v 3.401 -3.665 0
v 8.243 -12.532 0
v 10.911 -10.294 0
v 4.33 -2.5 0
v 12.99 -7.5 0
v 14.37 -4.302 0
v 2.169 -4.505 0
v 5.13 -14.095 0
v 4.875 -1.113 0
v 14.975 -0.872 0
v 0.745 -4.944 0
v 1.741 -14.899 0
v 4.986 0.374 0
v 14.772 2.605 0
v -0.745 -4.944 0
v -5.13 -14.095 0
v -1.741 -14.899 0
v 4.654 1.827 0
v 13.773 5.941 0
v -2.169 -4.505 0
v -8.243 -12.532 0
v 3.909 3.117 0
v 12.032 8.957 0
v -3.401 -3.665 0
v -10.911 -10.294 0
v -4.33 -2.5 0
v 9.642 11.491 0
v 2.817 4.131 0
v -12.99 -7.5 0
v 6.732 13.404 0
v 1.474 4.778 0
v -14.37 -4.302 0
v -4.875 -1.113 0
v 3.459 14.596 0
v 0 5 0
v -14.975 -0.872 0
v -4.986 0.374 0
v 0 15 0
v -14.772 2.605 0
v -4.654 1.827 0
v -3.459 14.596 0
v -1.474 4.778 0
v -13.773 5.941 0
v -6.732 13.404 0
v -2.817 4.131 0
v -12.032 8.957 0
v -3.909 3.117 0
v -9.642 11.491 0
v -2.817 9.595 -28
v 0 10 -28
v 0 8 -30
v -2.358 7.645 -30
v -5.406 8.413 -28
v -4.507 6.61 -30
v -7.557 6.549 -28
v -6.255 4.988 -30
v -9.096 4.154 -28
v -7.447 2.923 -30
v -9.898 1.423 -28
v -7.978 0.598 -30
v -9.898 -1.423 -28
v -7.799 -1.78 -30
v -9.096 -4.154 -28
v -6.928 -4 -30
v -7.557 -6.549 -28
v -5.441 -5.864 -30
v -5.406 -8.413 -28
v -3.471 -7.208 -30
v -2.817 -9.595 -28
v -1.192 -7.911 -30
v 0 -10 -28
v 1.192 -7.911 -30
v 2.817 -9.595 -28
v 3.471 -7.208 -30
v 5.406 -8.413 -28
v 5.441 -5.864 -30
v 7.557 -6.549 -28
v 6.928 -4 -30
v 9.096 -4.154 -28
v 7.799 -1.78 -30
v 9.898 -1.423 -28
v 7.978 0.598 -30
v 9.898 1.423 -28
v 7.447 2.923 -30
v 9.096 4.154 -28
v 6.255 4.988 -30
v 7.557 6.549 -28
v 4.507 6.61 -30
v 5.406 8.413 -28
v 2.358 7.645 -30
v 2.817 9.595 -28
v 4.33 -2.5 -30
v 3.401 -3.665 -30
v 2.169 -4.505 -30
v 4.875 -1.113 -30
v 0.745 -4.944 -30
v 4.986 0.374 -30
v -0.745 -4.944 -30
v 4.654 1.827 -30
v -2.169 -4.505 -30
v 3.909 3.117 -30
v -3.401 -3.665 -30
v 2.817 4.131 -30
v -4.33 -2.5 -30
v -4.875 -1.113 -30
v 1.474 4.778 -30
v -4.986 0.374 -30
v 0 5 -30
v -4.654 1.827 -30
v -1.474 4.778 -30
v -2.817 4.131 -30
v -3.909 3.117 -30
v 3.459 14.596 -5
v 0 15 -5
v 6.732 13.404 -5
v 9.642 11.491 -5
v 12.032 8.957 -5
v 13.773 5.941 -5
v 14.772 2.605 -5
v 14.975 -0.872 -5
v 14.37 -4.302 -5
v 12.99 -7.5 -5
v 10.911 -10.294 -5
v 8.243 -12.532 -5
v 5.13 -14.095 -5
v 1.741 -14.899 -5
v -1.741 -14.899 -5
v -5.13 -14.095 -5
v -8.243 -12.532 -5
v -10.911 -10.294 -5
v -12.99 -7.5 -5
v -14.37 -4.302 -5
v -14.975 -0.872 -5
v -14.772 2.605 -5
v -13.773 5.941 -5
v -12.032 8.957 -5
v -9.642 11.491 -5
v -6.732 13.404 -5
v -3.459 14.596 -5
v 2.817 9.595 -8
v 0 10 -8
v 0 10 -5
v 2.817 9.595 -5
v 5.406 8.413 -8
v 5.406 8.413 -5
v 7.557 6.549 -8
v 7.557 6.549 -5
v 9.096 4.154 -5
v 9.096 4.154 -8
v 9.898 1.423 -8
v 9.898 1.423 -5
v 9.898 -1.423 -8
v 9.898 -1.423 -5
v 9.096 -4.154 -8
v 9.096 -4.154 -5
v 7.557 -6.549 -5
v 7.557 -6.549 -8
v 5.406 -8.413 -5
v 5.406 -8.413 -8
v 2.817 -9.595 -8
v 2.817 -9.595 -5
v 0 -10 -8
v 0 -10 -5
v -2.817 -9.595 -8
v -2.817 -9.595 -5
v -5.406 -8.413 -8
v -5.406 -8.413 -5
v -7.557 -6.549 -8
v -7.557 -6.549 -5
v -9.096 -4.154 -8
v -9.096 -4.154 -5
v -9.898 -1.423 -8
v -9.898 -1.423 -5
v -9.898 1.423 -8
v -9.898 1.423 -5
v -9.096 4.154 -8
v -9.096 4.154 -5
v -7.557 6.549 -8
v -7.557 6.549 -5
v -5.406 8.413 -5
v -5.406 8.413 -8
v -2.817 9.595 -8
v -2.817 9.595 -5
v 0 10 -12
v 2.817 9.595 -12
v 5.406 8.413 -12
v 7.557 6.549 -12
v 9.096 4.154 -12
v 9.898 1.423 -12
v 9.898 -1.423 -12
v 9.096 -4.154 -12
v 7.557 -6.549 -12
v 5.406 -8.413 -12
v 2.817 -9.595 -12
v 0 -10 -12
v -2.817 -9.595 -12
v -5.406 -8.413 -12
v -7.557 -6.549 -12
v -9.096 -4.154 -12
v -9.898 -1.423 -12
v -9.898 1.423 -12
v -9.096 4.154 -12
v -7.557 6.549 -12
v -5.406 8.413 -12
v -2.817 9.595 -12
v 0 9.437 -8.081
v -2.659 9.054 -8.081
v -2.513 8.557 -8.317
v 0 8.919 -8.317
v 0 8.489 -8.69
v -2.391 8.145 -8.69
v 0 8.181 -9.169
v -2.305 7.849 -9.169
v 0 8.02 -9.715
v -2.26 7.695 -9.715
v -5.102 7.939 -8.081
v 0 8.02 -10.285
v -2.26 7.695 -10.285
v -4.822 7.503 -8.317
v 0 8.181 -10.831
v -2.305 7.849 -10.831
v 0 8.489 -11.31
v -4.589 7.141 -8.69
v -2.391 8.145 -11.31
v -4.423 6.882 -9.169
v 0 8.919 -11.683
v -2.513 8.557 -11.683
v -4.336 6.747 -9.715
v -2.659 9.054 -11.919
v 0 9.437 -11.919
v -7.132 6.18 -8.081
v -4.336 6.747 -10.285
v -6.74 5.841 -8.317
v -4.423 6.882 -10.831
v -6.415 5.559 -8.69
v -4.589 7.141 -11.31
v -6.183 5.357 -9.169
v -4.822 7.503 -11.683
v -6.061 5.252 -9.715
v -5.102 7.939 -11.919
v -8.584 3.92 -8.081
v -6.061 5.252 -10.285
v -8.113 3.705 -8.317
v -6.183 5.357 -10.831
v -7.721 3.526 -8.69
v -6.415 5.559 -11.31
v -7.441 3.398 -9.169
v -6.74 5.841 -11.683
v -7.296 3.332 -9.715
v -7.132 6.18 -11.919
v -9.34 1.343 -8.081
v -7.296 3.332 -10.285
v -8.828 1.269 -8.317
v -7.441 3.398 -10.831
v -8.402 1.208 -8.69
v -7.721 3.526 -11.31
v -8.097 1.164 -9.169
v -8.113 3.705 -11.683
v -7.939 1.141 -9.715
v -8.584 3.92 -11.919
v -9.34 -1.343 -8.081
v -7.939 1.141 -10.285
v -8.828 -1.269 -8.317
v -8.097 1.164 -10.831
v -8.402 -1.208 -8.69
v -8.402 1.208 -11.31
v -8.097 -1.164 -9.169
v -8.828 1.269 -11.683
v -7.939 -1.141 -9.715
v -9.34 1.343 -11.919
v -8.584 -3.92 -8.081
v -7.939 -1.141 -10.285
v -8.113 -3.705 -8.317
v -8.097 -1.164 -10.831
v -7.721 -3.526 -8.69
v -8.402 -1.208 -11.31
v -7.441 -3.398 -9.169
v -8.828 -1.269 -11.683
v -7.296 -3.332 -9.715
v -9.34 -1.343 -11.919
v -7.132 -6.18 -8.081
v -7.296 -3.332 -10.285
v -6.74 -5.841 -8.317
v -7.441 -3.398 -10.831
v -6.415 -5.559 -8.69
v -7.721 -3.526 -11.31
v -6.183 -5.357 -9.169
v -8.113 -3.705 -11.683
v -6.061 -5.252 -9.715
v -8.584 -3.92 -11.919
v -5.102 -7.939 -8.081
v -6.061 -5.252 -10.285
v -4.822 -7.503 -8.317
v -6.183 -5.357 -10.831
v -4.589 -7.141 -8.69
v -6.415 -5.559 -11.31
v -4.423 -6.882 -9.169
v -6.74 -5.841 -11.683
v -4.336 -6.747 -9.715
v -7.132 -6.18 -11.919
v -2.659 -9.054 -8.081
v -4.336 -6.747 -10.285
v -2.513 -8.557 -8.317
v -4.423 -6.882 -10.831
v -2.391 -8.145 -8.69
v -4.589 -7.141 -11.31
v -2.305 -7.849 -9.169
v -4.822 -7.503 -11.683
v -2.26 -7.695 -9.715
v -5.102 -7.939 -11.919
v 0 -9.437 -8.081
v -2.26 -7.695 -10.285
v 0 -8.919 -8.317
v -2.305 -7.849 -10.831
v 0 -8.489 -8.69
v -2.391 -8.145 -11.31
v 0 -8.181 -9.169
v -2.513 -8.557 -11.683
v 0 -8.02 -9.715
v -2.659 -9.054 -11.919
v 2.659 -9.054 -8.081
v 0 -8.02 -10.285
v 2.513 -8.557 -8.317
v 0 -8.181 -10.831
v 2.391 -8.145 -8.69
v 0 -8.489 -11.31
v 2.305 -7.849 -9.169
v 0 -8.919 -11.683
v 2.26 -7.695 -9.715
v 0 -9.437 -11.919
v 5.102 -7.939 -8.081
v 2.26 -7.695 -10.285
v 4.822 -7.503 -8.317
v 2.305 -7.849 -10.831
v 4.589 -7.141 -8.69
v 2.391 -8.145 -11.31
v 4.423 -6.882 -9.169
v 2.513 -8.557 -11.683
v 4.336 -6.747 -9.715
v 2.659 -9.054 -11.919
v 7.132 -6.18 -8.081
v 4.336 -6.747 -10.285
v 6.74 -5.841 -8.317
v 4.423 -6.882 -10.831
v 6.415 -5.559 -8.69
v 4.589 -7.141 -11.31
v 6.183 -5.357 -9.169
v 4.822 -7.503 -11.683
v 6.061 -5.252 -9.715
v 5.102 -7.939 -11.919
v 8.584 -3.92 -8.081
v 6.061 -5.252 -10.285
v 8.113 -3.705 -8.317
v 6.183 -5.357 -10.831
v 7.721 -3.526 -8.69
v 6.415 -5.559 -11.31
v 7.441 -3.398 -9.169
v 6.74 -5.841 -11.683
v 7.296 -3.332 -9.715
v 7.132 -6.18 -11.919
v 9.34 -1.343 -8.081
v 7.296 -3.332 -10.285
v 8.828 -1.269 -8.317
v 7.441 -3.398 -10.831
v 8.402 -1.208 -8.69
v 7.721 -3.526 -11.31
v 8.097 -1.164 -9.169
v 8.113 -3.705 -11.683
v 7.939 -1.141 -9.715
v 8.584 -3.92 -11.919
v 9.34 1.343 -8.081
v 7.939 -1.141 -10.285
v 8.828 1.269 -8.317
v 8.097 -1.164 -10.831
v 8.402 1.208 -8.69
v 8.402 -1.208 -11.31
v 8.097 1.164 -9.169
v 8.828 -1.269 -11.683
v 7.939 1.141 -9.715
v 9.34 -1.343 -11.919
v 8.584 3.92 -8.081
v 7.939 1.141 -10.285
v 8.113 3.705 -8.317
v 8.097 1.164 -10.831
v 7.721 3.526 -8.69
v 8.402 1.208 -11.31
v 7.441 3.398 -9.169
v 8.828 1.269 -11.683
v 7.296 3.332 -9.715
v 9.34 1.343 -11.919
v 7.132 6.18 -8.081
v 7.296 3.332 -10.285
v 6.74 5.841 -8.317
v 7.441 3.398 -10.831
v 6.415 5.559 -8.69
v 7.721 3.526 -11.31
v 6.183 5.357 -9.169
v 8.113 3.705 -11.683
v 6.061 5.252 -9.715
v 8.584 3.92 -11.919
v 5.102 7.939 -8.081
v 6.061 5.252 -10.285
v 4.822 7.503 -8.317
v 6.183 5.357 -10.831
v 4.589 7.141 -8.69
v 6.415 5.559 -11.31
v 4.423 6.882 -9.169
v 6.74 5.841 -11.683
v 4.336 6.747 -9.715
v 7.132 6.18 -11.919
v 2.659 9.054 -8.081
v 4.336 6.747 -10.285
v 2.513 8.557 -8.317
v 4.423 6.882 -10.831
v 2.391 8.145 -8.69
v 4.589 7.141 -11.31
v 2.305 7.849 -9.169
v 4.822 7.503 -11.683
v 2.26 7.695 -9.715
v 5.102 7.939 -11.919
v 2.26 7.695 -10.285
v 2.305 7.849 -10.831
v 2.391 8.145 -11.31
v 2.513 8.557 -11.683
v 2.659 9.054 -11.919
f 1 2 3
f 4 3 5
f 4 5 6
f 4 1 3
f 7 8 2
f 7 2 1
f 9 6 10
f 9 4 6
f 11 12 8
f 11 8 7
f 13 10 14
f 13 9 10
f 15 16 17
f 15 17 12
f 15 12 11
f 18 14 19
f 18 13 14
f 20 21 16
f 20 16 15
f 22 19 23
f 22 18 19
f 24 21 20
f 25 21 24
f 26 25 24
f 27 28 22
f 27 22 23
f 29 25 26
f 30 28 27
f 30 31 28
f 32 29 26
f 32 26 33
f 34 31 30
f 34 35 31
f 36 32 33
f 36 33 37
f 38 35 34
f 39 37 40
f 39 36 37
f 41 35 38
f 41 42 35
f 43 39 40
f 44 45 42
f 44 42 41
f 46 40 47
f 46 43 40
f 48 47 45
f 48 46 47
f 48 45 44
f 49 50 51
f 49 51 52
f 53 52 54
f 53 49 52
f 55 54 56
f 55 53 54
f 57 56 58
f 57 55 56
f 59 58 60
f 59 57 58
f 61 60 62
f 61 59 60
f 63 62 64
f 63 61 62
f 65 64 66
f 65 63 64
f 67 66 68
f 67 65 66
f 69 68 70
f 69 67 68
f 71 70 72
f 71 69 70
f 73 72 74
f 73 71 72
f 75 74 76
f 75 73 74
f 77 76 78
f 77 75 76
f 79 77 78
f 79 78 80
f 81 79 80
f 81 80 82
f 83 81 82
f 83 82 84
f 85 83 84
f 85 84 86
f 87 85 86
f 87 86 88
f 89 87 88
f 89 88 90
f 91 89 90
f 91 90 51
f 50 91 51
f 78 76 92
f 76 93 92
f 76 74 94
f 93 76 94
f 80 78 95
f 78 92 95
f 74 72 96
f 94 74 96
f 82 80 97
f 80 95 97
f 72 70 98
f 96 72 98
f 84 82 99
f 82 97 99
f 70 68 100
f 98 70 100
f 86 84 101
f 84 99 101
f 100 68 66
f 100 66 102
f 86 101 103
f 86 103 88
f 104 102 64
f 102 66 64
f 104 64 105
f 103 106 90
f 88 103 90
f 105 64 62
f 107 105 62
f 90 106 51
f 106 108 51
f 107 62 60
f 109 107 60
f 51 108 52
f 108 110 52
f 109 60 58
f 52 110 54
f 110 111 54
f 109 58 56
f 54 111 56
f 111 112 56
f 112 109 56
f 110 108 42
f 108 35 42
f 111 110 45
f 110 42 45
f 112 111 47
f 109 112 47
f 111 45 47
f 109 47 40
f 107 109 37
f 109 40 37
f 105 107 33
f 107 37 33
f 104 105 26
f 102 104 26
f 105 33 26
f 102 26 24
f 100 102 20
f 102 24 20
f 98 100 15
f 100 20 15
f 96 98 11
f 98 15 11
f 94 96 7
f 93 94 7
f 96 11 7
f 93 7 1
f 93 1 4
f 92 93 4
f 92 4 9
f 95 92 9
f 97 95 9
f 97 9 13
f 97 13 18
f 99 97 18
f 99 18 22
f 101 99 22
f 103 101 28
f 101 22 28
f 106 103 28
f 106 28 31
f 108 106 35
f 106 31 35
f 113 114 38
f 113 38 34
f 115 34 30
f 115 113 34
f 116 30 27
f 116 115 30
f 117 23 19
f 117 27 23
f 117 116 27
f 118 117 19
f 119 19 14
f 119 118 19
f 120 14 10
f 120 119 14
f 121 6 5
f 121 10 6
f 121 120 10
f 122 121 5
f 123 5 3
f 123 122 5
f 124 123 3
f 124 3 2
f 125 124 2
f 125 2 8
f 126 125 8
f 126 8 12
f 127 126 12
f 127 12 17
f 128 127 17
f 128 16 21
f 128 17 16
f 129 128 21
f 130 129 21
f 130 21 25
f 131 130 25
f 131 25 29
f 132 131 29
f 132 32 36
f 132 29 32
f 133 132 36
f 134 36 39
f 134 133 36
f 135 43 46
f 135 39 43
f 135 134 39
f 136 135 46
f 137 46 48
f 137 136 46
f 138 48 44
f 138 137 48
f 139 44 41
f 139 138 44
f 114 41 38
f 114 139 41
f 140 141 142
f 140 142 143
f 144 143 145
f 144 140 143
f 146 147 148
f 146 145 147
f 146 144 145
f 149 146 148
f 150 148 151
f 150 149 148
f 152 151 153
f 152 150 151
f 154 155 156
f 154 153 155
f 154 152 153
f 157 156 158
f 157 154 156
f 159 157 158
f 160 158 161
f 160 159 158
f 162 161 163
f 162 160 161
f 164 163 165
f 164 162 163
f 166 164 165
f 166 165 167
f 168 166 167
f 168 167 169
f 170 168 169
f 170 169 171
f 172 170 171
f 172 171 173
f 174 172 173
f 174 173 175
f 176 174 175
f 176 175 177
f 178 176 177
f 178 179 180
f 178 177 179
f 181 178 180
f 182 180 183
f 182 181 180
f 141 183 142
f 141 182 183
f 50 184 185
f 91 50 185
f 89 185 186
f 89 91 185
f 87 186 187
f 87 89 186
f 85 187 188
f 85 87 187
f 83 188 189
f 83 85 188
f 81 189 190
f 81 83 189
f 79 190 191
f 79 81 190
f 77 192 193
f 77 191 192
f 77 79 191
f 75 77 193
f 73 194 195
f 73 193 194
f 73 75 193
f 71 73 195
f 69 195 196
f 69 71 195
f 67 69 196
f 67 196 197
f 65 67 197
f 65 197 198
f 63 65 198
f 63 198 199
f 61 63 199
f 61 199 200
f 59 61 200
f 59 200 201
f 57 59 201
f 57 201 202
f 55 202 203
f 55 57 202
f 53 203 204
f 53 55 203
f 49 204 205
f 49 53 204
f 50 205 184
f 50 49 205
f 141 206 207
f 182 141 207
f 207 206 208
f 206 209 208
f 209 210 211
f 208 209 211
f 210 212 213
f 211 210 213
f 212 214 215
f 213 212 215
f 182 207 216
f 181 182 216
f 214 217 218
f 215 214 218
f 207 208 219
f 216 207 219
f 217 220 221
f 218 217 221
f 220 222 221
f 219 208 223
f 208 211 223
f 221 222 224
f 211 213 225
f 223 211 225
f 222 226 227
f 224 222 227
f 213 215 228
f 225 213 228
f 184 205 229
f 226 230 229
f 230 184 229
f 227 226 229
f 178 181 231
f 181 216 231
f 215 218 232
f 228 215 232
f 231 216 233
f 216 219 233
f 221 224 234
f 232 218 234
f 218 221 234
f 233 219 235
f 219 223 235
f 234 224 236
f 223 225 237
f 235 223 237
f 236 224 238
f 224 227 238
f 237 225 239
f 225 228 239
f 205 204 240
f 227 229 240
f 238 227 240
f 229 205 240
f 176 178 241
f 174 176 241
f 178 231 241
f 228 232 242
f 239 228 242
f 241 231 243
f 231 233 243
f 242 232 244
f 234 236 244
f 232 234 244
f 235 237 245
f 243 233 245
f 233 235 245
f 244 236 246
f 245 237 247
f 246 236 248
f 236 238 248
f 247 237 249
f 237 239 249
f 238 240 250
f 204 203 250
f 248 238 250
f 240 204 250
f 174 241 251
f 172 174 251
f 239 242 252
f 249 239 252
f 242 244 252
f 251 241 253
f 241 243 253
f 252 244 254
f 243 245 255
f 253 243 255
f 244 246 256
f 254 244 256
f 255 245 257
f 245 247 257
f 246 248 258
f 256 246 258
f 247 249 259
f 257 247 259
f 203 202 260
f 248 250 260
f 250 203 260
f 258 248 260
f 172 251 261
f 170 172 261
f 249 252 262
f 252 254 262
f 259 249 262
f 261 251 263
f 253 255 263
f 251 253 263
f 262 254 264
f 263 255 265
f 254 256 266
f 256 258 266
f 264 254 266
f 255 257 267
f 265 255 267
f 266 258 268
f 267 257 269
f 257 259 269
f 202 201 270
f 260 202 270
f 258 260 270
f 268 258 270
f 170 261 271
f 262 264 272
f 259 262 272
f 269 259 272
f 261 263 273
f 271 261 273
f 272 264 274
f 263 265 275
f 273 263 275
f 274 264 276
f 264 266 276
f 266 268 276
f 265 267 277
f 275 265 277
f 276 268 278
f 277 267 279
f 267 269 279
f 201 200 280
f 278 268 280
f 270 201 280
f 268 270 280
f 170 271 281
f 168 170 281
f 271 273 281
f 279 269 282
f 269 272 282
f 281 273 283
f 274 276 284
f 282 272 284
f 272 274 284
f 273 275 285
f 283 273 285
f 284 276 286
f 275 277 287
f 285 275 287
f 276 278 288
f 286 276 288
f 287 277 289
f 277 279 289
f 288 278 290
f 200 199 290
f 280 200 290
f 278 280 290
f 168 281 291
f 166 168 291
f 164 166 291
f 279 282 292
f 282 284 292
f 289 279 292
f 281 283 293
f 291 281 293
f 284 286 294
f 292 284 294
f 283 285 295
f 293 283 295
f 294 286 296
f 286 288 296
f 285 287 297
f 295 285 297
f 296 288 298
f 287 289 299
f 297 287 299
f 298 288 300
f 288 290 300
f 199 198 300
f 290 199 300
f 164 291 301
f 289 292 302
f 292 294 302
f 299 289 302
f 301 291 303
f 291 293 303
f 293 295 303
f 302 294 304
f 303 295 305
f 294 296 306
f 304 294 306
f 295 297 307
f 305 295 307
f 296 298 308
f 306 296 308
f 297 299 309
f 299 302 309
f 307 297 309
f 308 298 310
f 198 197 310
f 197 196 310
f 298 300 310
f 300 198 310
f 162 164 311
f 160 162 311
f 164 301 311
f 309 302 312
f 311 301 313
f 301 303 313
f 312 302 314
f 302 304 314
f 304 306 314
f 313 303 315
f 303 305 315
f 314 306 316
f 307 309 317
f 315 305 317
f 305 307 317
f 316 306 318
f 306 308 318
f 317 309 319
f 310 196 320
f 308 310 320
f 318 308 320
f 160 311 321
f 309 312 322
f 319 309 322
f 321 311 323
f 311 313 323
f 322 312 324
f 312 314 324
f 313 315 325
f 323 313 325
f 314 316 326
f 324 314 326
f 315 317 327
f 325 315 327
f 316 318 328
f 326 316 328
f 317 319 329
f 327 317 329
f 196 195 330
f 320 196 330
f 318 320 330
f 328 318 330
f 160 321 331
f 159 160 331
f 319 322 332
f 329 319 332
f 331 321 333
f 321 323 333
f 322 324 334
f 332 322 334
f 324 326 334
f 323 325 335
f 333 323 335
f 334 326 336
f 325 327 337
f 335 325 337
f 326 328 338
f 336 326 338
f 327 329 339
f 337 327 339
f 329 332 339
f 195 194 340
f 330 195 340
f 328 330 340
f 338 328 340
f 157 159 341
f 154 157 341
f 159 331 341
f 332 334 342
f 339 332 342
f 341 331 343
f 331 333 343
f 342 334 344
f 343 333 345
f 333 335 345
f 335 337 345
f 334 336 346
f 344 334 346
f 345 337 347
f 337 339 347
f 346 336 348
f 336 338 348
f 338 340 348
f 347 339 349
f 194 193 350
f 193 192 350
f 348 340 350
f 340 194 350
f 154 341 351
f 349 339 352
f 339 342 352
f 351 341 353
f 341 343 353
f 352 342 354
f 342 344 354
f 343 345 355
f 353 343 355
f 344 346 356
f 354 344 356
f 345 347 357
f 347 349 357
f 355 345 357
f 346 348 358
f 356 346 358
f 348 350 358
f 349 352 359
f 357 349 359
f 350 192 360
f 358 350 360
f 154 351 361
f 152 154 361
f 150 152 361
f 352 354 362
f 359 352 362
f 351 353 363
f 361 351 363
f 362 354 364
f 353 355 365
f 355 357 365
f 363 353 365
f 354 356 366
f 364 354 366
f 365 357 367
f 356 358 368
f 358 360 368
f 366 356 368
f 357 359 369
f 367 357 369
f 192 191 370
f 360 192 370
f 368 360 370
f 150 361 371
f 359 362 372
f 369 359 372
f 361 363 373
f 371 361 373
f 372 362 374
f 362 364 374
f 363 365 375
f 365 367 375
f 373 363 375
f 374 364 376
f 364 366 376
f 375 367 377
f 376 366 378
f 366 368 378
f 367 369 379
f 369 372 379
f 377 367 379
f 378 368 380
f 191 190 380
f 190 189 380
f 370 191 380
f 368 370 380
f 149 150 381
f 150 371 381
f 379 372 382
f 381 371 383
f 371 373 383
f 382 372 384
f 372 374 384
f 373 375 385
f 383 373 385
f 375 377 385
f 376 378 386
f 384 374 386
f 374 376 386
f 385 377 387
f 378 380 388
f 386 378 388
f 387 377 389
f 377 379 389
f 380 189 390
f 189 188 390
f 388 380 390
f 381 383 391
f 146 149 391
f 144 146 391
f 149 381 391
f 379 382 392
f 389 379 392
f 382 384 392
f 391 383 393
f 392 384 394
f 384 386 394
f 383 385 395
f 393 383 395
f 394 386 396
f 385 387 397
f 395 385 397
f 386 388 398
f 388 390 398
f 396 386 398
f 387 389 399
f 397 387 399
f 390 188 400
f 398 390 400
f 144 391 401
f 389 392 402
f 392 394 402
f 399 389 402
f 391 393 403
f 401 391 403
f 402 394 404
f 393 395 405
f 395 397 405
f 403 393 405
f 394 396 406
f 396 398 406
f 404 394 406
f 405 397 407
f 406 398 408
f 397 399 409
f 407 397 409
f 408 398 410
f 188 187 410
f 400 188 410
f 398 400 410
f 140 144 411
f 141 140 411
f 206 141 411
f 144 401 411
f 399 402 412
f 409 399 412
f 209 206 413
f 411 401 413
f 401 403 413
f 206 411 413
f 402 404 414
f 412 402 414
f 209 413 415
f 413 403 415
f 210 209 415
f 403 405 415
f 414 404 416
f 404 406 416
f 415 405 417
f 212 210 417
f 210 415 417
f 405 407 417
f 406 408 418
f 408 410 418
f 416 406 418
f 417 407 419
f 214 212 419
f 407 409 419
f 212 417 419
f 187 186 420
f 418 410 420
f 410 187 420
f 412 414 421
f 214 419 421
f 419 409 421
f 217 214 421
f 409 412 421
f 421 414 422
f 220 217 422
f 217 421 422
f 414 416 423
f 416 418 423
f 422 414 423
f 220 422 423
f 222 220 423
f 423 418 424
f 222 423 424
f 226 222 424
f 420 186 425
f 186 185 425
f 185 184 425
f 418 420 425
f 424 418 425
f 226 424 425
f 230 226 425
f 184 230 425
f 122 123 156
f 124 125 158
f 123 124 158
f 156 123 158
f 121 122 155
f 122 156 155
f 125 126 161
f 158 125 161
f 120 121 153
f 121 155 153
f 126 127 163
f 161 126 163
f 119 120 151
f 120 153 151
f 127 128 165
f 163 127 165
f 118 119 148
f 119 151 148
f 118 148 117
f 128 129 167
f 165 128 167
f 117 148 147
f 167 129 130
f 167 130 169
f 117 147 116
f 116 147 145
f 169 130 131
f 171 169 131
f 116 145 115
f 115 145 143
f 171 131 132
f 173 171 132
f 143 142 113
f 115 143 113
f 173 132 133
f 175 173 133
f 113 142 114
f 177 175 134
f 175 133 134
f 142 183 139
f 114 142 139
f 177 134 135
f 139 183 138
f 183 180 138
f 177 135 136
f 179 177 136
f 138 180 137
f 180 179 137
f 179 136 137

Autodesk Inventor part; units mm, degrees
ref_plane "YZ Plane" through (0, 0, 0) normal (1, 0, 0) x (0, 1, 0)
ref_plane "XZ Plane" through (0, 0, 0) normal (0, 1, 0) x (-1, 0, 0)
ref_plane "XY Plane" through (0, 0, 0) normal (0, 0, 1) x (1, 0, 0)
sketch "Esboço1" plane through (0, 0, 0) normal (1, 0, 0) x (0, 1, 0)
  line L0 (0, 0) -> (15, 0)
  line L1 (15, 0) -> (15, -5)
  line L2 (15, -5) -> (10, -5)
  line L3 (10, -30) -> (0, -30)
  line L4 (0, -30) -> (0, 0)
  line L5 (10, -5) -> (10, -8)
  arc A0 (10, -8) -> (10, -12) centre (10, -10) ccw
  line L6 (10, -12) -> (10, -30)
  point P0 (12.5, -5)
  point P1 (10, -6.5)
  dimension "d0" = 30
  dimension "d2" = 5
  dimension "d3" = 30
  dimension "d5" = 20
  dimension "d6" = 2
  dimension "d14" = 20
revolve "Revolução1" add sketch "Esboço1" angle 360 about axis through (0, 0, -30) along (0, 0, 1)
sketch "Esboço2" plane through (0, 0, -30) normal (0, 0, -1) x (-1, 0, 0)
  circle A0 centre (0, 0) radius 10 projected
hole "Furo1" at (0, 0, -30) direction (0, 0, 1) diameter 10 end through all
thread "Rosca1" size "M20x2.5" class "6g" standard "ANSI Metric M Profile" length 15
chamfer "Chanfro1" distance 2 angle 45 1 edges at (0, -10, -30)
properties part number "3D Model"
